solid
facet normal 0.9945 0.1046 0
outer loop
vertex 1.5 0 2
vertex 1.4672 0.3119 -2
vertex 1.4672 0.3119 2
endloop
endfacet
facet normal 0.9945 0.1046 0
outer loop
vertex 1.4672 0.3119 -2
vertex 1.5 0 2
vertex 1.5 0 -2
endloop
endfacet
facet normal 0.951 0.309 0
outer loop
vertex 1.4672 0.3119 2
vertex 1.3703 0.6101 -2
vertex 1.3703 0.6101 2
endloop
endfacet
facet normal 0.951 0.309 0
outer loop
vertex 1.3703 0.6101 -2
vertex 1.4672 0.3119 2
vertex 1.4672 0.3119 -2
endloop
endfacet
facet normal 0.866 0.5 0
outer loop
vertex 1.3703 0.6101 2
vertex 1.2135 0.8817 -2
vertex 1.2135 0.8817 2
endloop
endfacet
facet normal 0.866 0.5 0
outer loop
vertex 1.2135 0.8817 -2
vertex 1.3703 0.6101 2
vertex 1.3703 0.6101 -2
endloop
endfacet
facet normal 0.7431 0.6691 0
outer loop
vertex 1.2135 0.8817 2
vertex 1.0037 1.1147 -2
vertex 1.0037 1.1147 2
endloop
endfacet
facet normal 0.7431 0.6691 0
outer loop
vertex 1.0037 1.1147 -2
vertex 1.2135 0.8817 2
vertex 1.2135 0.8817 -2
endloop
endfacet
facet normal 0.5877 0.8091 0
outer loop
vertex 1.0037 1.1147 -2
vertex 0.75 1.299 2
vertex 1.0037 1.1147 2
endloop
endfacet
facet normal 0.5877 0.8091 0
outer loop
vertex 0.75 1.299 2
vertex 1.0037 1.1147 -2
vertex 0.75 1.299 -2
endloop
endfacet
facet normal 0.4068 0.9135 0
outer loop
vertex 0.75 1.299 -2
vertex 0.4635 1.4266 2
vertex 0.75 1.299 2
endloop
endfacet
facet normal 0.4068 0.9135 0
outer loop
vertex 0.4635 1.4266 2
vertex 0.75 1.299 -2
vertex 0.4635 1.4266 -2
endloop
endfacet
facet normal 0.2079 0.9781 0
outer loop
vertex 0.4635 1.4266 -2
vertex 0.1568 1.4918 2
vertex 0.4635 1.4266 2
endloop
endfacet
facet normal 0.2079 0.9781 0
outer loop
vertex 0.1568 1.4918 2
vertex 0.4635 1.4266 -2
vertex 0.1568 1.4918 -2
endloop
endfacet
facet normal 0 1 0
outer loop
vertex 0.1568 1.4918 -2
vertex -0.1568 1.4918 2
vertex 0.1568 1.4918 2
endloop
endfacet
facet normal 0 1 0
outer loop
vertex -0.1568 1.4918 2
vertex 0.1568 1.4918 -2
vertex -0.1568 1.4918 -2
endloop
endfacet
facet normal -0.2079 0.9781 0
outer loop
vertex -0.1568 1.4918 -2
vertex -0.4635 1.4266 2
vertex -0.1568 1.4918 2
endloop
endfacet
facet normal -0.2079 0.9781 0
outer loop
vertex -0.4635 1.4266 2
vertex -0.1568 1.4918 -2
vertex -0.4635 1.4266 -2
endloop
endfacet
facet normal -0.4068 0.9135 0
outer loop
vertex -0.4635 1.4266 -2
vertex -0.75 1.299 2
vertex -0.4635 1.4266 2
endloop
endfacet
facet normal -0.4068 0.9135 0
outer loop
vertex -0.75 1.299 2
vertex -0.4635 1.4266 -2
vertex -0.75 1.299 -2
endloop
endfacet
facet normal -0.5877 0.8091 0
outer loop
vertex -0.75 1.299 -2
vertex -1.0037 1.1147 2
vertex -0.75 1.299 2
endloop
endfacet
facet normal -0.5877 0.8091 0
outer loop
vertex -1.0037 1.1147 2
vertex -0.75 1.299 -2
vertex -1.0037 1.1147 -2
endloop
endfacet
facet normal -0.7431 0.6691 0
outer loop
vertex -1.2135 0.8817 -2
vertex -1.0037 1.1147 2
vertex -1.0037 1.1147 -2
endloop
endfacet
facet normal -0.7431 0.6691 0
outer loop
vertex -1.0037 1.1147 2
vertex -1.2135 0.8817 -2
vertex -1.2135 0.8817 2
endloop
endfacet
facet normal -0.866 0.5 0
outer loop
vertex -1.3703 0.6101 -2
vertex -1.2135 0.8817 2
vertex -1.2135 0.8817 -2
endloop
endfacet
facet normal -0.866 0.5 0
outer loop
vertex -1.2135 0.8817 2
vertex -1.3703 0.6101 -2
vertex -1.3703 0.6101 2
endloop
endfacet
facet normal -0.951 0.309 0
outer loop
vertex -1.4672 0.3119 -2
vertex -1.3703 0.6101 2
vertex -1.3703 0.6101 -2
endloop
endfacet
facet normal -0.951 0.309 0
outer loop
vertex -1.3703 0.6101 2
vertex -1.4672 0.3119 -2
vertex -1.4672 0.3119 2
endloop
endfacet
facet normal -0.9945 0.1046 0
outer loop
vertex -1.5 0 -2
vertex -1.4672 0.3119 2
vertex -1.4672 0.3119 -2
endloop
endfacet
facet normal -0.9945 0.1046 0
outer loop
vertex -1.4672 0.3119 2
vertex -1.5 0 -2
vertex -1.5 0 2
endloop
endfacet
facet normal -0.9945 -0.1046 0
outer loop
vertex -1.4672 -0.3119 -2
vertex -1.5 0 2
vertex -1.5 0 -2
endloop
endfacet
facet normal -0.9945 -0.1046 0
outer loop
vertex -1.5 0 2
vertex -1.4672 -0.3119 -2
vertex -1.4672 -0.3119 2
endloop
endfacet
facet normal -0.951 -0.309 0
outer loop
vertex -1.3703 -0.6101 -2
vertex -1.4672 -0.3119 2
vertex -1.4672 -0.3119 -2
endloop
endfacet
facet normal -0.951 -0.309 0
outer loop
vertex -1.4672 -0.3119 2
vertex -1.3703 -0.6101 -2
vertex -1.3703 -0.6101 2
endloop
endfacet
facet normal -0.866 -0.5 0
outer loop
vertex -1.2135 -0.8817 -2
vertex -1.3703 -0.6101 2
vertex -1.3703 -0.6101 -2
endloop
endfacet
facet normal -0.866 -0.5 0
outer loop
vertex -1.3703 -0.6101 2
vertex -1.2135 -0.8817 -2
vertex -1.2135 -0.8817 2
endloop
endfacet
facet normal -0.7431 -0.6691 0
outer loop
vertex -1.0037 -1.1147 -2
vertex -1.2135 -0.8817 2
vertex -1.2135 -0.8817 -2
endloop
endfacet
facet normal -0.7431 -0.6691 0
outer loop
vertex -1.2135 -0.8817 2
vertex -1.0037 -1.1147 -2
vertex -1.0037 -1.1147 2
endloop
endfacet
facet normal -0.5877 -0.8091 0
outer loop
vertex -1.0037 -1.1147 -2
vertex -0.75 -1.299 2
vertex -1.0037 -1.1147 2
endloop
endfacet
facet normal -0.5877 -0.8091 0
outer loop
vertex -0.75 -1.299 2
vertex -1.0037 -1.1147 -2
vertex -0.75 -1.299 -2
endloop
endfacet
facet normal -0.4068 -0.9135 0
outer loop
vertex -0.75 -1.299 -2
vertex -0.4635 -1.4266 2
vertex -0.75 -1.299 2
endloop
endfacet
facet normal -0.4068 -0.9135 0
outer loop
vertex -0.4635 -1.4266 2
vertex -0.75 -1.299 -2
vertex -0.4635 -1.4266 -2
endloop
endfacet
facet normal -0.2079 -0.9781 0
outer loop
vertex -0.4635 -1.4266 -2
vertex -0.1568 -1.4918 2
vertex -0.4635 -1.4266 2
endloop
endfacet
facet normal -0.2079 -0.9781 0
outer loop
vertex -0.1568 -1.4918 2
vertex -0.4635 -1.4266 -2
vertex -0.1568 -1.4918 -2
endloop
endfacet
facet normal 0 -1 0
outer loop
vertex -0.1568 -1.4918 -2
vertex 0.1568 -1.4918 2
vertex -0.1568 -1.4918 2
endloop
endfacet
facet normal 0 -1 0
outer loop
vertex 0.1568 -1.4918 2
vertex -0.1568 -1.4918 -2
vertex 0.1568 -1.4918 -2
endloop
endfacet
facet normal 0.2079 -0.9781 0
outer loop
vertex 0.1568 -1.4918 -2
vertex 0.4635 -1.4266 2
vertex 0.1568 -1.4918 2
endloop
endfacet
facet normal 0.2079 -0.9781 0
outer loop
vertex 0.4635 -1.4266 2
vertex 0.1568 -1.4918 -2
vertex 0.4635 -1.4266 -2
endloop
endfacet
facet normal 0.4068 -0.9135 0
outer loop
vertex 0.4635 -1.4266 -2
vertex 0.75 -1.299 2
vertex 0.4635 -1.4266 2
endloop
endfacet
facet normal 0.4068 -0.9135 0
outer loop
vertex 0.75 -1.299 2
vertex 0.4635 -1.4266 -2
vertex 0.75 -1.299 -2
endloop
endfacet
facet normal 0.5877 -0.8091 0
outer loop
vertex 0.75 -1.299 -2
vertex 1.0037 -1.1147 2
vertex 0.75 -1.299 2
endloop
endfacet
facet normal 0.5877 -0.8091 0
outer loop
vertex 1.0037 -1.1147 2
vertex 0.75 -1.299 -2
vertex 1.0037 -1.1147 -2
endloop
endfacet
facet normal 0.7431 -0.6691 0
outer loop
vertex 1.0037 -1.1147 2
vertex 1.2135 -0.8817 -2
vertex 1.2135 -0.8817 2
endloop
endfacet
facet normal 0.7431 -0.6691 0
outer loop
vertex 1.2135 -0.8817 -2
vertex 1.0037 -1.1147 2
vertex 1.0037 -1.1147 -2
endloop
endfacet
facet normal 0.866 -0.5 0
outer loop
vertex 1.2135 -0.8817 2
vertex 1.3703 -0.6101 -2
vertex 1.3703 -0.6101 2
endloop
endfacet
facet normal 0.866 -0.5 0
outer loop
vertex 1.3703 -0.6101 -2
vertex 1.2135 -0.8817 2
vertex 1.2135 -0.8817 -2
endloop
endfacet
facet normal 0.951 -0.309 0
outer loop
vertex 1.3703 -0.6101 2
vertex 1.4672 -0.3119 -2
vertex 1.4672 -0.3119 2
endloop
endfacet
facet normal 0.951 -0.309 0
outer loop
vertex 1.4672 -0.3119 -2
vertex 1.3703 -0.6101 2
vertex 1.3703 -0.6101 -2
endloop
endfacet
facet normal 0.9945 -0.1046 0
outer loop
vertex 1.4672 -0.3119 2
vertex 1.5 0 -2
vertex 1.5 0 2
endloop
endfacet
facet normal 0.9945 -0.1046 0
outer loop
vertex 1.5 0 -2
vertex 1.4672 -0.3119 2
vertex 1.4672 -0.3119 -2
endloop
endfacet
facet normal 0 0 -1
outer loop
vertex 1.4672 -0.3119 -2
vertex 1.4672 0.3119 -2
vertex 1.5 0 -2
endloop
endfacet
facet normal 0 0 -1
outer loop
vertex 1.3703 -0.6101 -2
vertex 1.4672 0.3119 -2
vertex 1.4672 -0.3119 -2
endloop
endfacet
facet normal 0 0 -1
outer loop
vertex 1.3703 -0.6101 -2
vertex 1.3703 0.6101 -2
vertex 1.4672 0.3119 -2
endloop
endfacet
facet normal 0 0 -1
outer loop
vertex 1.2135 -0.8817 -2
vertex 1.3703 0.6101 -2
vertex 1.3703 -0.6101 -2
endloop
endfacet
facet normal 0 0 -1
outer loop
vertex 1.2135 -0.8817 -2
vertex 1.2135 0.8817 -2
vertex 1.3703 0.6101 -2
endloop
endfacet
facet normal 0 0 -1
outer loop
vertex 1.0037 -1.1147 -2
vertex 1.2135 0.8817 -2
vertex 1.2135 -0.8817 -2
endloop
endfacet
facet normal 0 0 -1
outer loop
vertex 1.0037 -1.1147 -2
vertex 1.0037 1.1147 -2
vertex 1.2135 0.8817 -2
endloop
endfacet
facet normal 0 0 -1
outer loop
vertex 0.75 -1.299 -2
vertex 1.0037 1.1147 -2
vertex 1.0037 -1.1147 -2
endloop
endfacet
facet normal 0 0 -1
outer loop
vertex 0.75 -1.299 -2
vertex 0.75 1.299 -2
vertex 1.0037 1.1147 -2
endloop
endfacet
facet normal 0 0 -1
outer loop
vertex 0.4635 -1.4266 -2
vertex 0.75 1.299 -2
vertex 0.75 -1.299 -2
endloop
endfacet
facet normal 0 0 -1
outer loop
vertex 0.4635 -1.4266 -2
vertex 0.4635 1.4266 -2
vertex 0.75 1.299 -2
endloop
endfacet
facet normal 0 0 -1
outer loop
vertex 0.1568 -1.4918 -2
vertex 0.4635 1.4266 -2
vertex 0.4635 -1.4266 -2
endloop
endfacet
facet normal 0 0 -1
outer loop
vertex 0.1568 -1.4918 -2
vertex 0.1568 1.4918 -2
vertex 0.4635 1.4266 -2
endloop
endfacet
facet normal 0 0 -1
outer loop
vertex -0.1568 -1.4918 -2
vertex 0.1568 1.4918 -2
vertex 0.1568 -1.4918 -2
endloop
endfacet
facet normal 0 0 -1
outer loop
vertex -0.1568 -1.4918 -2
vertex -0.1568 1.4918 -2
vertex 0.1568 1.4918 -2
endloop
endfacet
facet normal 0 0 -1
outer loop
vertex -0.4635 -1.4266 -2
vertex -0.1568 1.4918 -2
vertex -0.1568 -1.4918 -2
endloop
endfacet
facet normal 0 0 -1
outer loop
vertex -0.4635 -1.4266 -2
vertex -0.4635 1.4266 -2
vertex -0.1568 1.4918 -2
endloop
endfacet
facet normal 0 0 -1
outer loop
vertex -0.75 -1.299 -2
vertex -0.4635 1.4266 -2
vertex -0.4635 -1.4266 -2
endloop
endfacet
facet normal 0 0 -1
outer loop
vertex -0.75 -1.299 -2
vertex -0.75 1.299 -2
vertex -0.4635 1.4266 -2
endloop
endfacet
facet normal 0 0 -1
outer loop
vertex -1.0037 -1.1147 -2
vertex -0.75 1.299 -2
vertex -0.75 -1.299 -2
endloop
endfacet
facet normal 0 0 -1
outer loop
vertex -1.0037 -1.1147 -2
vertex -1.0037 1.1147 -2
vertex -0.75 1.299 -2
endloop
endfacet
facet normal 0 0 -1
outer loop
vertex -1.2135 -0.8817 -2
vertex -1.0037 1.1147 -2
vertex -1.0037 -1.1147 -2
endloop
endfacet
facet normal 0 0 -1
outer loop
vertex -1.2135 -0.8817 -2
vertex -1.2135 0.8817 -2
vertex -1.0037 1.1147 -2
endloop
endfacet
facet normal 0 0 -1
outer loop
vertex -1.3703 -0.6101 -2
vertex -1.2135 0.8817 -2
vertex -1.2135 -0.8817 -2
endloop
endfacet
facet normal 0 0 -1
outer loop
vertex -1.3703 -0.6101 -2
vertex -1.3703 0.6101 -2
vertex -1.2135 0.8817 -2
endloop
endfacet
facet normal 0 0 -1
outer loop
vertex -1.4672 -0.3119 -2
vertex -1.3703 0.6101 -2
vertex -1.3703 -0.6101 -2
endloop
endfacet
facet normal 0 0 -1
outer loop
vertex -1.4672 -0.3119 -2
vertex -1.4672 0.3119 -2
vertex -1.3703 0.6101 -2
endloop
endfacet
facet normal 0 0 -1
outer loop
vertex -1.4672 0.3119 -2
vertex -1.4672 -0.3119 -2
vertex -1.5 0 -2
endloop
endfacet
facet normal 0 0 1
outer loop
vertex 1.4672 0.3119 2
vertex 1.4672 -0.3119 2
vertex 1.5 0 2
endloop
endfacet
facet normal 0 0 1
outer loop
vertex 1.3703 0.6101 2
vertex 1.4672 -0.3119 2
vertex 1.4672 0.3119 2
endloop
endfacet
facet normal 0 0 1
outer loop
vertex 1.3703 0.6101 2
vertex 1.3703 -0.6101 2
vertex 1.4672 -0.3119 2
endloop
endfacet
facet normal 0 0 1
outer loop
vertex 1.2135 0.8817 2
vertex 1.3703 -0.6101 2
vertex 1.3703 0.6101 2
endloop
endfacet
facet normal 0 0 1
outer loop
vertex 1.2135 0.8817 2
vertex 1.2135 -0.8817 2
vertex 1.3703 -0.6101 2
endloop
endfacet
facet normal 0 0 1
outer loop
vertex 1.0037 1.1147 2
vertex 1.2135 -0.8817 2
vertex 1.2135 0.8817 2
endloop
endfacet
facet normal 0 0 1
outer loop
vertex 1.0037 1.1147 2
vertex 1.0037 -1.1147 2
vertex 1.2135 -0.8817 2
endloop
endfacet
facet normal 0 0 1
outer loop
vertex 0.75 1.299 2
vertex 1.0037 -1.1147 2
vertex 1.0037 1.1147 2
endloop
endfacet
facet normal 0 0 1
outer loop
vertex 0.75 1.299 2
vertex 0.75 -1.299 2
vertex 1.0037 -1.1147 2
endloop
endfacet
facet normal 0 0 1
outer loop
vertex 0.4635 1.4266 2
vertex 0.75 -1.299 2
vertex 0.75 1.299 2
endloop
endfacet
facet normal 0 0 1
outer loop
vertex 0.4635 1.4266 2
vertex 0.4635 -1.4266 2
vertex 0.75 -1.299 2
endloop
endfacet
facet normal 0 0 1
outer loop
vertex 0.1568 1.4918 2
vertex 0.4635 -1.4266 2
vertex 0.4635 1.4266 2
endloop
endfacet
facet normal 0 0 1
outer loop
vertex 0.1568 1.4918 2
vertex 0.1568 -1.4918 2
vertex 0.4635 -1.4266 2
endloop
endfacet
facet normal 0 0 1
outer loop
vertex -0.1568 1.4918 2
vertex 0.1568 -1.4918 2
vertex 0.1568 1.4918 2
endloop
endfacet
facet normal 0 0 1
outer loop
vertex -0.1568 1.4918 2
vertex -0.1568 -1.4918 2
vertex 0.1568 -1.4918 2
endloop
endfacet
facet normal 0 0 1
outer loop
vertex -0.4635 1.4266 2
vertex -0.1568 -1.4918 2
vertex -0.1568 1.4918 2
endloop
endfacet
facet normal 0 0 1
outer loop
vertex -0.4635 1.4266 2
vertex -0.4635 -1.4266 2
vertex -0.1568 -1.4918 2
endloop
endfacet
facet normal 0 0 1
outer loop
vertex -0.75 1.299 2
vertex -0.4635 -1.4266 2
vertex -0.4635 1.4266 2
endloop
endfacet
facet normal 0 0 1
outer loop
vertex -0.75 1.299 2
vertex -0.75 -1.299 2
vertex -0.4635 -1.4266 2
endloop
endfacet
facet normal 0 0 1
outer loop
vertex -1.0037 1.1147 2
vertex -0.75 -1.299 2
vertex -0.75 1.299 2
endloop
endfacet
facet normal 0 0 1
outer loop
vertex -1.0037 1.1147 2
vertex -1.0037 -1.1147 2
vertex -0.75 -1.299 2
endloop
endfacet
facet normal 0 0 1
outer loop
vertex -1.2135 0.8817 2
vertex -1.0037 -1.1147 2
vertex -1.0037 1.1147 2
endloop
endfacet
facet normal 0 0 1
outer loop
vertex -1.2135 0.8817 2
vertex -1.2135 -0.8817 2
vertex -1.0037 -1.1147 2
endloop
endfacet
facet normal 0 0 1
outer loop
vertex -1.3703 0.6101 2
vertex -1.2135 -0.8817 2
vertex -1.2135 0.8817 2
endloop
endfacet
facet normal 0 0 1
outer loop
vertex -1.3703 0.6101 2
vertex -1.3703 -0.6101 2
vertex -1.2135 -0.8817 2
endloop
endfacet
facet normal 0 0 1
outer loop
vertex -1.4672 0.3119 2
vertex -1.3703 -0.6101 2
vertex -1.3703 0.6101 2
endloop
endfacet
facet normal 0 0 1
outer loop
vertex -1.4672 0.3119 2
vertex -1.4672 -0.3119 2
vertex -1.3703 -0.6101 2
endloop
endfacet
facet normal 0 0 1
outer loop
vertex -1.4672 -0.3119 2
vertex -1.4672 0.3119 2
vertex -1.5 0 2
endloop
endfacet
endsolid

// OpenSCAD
// part_id: b4
// name: B4 rivet pin
// source_drawing_ids: DRW-002
// units: mm
// revision: 0.2
// SPDX-License-Identifier: MIT

module part_b4(pin_d = 3.0, pin_h = 4.0) {
    cylinder(d = pin_d, h = pin_h, center = true, $fn = 30);
}

// ---- "main guard" ----
// Default to previewing when opened directly:
if (is_undef(__LIB_MODE__)) {
    part_b4();
}
